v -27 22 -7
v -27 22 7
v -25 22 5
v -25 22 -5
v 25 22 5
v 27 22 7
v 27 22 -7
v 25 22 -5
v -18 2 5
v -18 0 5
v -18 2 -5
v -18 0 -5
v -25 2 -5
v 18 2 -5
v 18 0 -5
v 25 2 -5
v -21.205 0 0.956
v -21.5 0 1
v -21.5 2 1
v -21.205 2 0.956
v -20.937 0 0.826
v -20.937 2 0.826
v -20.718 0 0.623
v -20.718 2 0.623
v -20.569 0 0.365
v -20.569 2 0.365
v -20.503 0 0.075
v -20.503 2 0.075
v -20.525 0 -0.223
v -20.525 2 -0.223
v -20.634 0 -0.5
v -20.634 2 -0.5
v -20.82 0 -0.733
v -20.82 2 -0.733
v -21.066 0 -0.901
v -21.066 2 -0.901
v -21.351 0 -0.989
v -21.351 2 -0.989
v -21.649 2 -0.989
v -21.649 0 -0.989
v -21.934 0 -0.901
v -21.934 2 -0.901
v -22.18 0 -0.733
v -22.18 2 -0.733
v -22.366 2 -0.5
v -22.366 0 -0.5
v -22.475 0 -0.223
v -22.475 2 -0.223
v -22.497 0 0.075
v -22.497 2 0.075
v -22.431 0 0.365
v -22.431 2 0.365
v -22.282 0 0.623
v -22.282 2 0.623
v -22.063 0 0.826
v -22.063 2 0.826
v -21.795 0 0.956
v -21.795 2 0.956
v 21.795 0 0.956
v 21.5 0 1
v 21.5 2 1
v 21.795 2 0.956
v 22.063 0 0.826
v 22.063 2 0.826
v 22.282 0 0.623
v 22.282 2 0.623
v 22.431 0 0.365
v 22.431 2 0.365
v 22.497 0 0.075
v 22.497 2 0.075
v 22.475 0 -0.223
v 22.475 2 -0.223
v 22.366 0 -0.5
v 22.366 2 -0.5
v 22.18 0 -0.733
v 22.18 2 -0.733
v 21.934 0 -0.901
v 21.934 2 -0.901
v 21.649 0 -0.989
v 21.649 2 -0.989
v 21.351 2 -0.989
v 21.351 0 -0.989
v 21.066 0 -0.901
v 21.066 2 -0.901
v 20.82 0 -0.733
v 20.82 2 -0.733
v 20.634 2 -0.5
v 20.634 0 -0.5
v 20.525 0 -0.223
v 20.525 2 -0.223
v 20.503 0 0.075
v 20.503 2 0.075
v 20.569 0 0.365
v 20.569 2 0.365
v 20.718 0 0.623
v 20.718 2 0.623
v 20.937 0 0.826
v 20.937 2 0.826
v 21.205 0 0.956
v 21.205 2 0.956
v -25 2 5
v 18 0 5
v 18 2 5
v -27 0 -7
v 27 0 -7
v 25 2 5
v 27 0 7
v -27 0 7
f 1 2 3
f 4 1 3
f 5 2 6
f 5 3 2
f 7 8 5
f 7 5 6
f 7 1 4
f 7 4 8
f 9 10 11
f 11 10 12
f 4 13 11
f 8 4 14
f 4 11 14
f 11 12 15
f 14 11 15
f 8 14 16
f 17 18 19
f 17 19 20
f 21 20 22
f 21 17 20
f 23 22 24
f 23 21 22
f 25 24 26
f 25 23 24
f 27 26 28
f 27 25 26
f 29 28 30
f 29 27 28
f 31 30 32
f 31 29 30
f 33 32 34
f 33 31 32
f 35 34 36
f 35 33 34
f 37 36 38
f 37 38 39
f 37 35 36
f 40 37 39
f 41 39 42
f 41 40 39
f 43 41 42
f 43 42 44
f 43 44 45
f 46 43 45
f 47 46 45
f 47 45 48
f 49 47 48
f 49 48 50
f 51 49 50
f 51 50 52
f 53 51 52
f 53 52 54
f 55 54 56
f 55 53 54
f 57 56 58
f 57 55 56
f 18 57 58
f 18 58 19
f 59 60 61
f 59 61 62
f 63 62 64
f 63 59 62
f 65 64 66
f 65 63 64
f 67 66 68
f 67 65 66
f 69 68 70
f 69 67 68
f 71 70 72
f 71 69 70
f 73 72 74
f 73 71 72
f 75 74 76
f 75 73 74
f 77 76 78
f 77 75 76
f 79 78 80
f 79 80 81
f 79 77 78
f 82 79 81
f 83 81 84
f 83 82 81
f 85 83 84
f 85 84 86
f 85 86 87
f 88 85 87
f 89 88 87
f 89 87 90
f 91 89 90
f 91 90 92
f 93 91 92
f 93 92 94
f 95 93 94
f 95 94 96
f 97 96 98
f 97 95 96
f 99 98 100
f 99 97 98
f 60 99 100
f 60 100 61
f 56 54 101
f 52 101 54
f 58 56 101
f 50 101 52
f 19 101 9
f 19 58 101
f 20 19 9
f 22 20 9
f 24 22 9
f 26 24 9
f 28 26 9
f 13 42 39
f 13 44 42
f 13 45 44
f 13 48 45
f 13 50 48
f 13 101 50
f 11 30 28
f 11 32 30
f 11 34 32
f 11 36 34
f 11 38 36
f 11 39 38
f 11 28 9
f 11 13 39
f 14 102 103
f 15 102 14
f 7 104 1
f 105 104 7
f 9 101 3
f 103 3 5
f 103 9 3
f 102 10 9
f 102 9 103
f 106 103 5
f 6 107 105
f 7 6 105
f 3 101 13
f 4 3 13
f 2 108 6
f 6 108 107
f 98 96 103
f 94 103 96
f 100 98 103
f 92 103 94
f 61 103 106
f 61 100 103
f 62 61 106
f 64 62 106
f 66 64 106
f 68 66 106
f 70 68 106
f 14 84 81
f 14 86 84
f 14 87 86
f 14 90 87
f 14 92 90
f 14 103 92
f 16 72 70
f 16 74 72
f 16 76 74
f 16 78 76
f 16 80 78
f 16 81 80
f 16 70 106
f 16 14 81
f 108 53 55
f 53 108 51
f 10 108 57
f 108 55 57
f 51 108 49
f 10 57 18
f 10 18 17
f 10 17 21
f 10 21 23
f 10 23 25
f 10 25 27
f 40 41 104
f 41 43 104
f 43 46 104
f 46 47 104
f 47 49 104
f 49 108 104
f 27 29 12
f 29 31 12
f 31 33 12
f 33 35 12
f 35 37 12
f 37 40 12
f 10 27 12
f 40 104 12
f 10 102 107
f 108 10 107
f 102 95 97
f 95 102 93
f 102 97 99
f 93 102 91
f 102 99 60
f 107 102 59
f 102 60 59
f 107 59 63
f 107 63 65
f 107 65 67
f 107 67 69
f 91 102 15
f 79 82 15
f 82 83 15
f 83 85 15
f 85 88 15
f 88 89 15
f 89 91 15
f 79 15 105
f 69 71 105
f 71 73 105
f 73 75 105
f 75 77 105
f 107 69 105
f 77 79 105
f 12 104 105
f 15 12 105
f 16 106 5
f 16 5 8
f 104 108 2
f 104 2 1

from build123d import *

# Parameters (mm, degrees)
SKETCH3_W           = 54
SKETCH3_H           = 14
SKETCH3_W_2         = 50
SKETCH3_H_2         = 10
BOSS_EXTRUDE1_DEPTH = 22
SKETCH4_W           = 7
SKETCH4_H           = 10
SKETCH4_R           = 1
BOSS_EXTRUDE2_DEPTH = 2


with BuildPart() as part:
    # Sketch3 → Boss-Extrude1 (new body)
    with BuildSketch(Plane(origin=(0, 0, 0), x_dir=(1, 0, 0), z_dir=(0, 1, 0))):
        Rectangle(SKETCH3_W, SKETCH3_H)
        Rectangle(SKETCH3_W_2, SKETCH3_H_2, mode=Mode.SUBTRACT)
    extrude(amount=BOSS_EXTRUDE1_DEPTH)

    # Sketch4 → Boss-Extrude2 (add)
    # profile 1 of 2: a face of its own
    with BuildSketch(Plane(origin=(0, 0, 0), x_dir=(1, 0, 0), z_dir=(0, 1, 0))):
        with Locations((-21.5, 0)):
            Rectangle(SKETCH4_W, SKETCH4_H)
        with Locations(Location((-21.5, 0, 0), (0, 0, 270))):
            Circle(SKETCH4_R, mode=Mode.SUBTRACT)
    # profile 2 of 2: a face of its own
    with BuildSketch(Plane(origin=(0, 0, 0), x_dir=(1, 0, 0), z_dir=(0, 1, 0))):
        with Locations((21.5, 0)):
            Rectangle(SKETCH4_W, SKETCH4_H)
        with Locations(Location((21.5, 0, 0), (0, 0, 270))):
            Circle(SKETCH4_R, mode=Mode.SUBTRACT)
    extrude(amount=BOSS_EXTRUDE2_DEPTH)


solid = part.part
